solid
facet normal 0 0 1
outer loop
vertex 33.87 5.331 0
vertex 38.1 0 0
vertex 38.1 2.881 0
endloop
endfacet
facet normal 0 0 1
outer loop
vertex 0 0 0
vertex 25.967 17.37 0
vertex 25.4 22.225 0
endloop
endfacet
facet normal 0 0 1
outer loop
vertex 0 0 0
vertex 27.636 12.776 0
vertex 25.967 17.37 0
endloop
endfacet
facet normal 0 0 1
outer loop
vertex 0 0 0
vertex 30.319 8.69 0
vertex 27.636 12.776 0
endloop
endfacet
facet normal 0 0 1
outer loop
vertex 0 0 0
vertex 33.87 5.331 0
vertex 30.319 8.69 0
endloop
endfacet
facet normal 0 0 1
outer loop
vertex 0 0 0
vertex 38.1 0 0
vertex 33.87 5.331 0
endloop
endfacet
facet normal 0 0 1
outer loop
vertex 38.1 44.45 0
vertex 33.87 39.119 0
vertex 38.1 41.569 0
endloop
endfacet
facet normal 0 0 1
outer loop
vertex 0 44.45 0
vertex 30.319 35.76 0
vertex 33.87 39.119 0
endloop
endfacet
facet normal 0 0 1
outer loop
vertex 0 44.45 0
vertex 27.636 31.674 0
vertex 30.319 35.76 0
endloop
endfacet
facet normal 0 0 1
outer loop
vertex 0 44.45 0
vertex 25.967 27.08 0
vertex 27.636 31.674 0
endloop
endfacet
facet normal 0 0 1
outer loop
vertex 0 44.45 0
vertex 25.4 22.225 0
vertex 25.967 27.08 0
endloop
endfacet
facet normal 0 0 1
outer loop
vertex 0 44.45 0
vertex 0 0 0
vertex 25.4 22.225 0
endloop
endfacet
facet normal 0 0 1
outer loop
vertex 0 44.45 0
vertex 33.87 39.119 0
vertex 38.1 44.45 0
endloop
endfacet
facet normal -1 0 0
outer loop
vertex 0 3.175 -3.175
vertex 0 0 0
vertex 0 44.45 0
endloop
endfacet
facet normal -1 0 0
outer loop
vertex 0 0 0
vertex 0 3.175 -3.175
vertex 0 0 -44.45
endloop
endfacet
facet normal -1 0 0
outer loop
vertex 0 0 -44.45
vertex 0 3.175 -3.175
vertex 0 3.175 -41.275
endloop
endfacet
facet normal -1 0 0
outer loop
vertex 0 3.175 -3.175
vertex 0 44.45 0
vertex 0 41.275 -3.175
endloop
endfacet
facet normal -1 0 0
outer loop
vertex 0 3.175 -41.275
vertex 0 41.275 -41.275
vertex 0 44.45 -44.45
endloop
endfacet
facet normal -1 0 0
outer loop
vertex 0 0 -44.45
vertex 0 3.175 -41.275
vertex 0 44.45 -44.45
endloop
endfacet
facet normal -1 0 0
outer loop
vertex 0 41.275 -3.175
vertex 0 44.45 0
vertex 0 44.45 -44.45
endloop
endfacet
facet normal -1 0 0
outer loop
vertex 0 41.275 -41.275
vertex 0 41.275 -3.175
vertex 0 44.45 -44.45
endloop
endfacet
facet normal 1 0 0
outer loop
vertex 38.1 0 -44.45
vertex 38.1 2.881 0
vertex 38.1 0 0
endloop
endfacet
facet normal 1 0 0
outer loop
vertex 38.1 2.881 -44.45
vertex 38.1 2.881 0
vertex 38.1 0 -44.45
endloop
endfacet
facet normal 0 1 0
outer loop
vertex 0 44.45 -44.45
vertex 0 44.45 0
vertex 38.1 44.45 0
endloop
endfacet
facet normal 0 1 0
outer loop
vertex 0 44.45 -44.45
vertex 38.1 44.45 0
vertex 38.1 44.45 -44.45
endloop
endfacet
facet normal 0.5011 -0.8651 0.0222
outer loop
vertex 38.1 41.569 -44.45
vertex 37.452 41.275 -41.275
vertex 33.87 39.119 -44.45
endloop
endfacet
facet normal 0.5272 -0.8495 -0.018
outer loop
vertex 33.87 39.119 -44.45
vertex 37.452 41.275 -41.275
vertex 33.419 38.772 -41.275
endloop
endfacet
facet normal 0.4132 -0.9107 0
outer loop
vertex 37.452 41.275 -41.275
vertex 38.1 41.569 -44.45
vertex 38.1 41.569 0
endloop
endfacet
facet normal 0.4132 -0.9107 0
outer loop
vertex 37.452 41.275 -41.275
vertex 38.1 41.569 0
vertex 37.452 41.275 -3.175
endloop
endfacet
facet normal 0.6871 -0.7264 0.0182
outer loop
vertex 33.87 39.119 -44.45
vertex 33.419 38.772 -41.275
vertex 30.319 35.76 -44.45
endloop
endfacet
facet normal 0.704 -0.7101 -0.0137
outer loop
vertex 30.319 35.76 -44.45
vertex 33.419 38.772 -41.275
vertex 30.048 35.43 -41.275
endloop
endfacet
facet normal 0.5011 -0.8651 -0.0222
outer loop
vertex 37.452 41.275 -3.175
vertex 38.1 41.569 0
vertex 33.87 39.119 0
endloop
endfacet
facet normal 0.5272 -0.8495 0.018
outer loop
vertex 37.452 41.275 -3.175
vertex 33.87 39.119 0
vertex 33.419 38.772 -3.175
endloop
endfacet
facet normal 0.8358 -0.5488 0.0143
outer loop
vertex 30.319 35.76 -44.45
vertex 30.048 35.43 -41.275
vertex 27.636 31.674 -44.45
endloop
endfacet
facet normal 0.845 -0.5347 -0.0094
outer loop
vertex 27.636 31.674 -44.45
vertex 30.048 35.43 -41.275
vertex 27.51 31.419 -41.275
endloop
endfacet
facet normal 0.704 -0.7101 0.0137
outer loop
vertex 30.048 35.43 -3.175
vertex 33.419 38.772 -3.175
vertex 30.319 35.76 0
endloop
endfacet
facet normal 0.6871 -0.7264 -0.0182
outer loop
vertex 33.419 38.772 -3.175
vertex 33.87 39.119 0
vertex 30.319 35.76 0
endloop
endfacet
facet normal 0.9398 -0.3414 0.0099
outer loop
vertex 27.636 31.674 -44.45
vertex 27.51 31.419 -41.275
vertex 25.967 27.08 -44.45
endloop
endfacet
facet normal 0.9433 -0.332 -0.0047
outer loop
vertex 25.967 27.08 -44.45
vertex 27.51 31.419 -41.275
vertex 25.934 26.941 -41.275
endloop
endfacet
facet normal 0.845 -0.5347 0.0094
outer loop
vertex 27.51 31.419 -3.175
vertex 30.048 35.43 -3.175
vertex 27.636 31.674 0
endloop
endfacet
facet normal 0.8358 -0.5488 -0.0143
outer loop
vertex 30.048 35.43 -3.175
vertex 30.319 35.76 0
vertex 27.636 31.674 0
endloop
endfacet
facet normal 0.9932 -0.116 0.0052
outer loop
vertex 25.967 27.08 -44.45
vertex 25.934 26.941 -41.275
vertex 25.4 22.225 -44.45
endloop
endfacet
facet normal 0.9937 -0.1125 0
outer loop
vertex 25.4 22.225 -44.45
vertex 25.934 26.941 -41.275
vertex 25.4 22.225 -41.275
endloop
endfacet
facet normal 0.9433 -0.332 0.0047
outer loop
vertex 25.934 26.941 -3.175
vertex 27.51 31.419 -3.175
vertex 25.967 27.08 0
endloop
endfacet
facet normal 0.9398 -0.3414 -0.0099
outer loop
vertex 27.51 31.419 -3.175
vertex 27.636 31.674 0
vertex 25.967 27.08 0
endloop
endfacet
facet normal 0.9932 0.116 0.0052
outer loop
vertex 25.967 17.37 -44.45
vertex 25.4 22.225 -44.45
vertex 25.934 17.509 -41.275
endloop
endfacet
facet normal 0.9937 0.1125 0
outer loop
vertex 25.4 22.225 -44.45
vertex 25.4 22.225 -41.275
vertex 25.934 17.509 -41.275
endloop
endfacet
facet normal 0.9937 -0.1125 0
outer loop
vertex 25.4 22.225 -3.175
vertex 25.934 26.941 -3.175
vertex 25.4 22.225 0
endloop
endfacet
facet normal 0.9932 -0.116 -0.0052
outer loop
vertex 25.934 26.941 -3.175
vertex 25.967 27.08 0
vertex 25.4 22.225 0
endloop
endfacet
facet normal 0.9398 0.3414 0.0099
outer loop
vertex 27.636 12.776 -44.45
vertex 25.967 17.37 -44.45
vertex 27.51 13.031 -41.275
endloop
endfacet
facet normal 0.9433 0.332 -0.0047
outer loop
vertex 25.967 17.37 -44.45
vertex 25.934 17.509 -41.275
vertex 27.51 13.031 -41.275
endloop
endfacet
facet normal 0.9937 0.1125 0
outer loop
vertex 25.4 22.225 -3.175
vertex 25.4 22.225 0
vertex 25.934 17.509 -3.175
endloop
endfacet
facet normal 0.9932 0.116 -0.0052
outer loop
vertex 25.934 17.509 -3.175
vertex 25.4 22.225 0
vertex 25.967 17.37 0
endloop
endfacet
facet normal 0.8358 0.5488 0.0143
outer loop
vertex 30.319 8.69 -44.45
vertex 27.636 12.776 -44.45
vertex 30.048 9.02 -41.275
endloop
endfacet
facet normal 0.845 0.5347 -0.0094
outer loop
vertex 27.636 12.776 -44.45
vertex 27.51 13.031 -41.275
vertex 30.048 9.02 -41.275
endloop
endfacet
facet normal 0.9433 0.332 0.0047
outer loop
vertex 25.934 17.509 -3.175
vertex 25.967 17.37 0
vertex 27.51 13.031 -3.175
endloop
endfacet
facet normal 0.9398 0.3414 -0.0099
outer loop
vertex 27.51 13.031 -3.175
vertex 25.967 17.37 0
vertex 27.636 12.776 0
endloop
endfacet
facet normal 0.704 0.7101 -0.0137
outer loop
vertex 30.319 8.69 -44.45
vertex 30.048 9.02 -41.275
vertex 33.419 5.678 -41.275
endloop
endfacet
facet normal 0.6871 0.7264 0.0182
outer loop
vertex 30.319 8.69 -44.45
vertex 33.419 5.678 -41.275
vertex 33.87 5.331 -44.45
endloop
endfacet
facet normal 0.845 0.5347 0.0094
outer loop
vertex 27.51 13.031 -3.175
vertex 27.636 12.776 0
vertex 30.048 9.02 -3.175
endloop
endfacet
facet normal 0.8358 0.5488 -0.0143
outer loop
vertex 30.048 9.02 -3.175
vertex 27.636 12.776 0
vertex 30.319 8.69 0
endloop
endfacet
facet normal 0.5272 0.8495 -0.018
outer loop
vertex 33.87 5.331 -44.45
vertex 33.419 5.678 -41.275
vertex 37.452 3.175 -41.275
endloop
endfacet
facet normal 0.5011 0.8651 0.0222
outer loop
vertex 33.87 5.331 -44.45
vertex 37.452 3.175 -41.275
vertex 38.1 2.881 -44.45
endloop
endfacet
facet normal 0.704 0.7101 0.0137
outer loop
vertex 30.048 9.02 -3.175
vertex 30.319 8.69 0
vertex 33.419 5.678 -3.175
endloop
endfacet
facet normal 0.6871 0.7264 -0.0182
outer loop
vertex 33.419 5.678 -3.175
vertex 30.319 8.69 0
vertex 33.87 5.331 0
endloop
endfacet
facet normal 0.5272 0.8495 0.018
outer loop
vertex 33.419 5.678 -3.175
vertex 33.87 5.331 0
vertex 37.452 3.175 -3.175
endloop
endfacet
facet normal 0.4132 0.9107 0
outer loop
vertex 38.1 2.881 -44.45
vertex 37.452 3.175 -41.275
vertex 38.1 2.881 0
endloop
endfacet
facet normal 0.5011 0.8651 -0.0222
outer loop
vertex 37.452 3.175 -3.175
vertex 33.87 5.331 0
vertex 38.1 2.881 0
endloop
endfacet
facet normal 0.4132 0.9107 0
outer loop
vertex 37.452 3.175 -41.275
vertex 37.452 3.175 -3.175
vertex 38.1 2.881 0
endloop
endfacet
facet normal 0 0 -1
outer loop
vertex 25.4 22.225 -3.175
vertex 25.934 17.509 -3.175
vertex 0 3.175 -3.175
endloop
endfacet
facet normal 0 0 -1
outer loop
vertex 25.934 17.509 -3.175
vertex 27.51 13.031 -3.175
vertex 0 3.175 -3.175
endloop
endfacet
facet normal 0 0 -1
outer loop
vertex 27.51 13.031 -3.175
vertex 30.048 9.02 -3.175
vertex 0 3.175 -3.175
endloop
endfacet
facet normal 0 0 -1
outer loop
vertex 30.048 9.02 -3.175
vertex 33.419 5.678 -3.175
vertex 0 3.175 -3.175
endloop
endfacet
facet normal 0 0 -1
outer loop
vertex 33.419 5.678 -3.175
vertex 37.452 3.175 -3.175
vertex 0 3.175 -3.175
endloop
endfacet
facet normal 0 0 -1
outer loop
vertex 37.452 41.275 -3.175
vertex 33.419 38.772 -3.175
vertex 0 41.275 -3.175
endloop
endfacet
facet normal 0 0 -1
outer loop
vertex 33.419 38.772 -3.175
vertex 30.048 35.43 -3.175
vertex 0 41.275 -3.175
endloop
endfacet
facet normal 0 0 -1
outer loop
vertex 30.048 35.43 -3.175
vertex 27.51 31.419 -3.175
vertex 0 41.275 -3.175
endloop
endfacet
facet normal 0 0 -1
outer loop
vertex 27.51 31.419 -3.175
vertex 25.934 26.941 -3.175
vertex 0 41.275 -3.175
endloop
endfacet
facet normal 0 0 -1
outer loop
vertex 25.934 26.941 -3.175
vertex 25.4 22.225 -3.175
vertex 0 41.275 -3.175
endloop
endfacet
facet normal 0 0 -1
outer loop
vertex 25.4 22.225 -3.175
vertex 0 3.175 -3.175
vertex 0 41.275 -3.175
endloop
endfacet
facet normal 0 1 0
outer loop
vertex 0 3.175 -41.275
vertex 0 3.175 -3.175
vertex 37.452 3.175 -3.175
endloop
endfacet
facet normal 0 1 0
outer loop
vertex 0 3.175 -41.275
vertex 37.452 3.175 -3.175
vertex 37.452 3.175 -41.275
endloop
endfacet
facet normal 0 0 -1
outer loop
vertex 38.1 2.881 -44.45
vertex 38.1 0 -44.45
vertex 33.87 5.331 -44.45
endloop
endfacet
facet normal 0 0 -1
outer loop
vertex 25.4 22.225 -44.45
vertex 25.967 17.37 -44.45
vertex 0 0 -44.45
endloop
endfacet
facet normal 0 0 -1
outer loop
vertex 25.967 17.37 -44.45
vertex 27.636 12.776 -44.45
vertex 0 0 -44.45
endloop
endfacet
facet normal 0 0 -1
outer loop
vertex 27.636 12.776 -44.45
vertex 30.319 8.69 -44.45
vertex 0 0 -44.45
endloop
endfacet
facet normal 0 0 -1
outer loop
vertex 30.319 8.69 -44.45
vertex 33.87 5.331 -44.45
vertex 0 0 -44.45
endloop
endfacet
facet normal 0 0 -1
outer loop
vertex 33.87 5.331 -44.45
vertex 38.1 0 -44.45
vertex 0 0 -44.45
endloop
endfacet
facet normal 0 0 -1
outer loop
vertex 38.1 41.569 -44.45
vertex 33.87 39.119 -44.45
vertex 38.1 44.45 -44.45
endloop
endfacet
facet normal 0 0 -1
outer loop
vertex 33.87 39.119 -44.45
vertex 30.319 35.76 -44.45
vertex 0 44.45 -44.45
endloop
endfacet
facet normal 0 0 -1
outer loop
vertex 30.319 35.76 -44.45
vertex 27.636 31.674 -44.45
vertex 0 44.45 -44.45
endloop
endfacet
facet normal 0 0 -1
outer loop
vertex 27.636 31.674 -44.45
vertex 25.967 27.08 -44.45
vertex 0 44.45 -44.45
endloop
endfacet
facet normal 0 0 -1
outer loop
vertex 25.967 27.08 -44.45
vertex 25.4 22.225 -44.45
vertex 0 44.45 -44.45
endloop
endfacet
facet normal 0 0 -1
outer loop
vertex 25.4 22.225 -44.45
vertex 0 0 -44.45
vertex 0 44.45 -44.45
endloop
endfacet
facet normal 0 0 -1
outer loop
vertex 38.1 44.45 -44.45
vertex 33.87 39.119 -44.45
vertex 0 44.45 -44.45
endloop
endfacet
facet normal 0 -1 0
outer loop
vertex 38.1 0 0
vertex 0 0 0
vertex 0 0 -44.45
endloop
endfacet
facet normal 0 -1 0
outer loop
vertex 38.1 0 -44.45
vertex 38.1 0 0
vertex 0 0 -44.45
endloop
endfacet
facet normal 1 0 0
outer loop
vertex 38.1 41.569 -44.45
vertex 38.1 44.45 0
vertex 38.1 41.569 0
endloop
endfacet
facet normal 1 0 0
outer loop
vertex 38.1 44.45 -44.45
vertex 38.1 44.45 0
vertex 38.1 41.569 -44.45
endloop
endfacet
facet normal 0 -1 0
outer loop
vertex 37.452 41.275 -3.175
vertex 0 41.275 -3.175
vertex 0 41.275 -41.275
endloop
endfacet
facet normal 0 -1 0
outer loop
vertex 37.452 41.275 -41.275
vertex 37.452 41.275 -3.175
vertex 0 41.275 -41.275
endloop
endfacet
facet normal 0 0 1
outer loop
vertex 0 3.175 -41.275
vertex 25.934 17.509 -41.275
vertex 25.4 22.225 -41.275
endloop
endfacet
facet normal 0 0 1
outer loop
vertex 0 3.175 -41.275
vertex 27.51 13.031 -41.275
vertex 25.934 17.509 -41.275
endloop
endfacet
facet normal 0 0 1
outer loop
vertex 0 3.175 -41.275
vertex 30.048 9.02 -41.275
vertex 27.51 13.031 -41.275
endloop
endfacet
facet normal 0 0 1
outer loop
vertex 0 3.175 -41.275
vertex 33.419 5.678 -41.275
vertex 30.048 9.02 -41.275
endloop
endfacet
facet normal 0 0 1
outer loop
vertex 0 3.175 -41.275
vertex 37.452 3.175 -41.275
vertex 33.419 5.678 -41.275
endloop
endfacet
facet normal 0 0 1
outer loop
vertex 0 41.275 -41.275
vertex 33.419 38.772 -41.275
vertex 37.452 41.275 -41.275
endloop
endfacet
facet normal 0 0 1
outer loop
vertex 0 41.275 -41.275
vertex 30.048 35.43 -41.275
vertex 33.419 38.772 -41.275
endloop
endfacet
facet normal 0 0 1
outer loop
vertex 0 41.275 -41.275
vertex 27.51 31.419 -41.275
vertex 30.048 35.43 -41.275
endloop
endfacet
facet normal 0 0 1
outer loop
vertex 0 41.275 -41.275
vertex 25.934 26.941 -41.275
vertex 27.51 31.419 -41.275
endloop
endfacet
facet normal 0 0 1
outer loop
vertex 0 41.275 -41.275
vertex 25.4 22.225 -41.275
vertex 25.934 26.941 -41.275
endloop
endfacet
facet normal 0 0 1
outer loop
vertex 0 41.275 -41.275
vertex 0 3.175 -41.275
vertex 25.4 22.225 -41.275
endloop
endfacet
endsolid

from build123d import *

# Parameters (mm, degrees)
SKETCH1_W               = 44.45
SKETCH1_H               = 44.45
SKETCH1_W_2             = 38.1
SKETCH1_H_2             = 38.1
BOSS_EXTRUDE1_DEPTH     = 38.1
SKETCH2_R               = 21.082
CUT_EXTRUDE1_DEPTH      = 1
CUT_EXTRUDE1_DEPTH_BACK = 45.45


with BuildPart() as part:
    # Sketch1 → Boss-Extrude1 (new body)
    with BuildSketch(Plane(origin=(0, 0, 0), x_dir=(0, 0, -1), z_dir=(1, 0, 0))):
        with Locations((22.225, 22.225)):
            Rectangle(SKETCH1_W, SKETCH1_H)
        with Locations((22.225, 22.225)):
            Rectangle(SKETCH1_W_2, SKETCH1_H_2, mode=Mode.SUBTRACT)
    extrude(amount=BOSS_EXTRUDE1_DEPTH)

    # Sketch2 → Cut-Extrude1 (cut, two sides)
    with BuildSketch(Plane.XY) as cut_extrude1_sk:
        with Locations((46.482, 22.225)):
            Circle(SKETCH2_R)
    extrude(amount=CUT_EXTRUDE1_DEPTH, mode=Mode.SUBTRACT)
    extrude(cut_extrude1_sk.sketch, amount=-CUT_EXTRUDE1_DEPTH_BACK, mode=Mode.SUBTRACT)


solid = part.part
